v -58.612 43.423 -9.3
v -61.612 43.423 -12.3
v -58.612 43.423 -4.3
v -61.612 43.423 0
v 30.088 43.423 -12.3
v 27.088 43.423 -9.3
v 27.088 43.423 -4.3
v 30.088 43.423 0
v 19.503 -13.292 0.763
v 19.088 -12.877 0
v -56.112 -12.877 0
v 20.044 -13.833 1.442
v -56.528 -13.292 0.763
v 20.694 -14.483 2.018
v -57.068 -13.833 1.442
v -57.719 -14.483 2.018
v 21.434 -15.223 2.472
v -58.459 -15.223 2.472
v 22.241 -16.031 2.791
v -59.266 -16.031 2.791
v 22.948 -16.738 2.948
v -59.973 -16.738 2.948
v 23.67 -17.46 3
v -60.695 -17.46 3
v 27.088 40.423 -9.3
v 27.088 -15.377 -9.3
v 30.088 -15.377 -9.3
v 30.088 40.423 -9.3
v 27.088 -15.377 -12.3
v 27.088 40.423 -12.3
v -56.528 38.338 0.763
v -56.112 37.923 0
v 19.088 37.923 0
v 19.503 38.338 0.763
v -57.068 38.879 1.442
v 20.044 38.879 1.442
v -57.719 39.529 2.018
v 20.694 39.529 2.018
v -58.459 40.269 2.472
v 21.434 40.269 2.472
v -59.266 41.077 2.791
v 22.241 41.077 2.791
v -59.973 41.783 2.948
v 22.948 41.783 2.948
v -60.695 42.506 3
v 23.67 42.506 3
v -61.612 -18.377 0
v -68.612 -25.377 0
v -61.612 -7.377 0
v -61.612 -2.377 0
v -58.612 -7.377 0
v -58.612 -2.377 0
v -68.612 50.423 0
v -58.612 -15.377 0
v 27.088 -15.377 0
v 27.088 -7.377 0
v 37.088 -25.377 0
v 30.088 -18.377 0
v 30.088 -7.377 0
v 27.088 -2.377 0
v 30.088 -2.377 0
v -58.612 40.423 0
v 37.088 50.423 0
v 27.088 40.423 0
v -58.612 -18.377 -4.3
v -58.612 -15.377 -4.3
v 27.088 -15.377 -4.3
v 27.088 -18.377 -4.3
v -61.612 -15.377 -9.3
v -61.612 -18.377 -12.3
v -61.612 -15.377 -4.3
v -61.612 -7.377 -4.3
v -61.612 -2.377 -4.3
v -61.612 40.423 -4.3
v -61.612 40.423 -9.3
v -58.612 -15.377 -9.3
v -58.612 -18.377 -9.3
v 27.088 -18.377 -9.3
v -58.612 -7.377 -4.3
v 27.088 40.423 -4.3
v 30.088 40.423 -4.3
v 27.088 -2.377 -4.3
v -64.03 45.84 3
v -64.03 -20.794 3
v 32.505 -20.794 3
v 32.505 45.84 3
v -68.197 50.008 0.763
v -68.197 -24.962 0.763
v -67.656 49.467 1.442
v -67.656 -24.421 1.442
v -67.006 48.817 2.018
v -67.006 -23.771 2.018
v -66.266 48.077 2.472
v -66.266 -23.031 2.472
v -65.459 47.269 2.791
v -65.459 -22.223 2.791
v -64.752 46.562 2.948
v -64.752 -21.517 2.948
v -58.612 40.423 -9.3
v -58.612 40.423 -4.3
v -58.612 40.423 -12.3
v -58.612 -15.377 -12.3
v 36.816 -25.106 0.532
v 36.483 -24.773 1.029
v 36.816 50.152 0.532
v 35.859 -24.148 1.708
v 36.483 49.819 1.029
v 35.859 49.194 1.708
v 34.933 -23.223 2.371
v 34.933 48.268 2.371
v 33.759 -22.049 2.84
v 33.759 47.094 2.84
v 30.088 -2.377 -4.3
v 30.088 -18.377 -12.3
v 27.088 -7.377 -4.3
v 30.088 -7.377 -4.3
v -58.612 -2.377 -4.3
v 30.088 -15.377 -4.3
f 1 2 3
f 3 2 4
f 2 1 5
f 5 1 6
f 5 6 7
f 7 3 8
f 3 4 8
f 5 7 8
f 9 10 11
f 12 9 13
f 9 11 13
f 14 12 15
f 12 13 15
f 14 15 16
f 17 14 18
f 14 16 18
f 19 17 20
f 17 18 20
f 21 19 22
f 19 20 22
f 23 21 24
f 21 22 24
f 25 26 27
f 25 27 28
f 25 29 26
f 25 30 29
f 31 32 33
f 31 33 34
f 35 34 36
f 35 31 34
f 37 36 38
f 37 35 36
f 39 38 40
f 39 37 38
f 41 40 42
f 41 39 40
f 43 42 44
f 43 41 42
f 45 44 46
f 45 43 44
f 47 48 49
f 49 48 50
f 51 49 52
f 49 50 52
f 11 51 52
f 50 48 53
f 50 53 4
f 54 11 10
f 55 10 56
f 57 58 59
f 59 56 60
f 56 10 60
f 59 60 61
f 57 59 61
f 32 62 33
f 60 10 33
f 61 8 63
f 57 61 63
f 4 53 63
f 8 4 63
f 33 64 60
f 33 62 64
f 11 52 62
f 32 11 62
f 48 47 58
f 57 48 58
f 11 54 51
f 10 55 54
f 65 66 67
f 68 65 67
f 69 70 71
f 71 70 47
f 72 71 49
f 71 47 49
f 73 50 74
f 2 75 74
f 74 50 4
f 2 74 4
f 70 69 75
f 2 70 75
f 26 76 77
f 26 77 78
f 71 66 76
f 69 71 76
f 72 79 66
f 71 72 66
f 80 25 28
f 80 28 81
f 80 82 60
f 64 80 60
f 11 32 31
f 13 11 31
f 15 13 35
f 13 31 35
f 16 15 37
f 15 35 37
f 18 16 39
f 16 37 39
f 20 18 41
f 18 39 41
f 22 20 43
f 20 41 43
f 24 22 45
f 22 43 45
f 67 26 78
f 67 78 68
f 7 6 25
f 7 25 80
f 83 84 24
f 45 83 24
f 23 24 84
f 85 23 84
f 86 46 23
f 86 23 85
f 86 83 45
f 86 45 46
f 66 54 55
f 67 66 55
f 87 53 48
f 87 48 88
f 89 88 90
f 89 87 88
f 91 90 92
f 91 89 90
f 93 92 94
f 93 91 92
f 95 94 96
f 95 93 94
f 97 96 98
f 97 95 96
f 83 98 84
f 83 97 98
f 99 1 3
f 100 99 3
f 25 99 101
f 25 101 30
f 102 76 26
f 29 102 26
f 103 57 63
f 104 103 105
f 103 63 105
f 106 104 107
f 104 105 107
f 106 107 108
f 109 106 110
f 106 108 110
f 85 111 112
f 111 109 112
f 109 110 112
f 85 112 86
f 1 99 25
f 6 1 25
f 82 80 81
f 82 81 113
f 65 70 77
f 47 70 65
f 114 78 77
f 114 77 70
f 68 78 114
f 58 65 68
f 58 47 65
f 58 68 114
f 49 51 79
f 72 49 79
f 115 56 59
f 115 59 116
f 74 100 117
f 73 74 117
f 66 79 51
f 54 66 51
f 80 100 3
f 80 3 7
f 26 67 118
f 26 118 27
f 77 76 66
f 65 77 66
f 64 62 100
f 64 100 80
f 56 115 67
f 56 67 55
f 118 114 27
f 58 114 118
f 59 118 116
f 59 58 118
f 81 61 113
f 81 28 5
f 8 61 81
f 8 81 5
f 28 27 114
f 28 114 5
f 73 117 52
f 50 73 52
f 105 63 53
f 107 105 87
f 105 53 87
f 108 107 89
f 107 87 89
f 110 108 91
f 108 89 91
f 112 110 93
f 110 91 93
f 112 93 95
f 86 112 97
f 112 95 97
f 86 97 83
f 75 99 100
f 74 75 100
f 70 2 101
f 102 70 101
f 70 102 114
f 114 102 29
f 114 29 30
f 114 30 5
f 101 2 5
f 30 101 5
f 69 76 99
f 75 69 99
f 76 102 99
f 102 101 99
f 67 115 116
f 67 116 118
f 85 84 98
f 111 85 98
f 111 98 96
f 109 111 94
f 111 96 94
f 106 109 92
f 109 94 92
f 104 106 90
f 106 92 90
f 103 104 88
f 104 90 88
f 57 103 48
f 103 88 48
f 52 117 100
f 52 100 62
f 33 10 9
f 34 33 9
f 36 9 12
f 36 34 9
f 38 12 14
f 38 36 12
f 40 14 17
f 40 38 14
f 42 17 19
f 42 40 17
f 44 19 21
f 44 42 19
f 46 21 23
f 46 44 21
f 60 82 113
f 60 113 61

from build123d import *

# Parameters (mm, degrees)
F2_W          = 105.7
F2_H          = 75.8
F2_W_2        = 8
F2_H_2        = 2.5
F2_H_3        = 50.8
F4_DEPTH      = 3
F3_W          = 91.7
F3_H          = 61.8
F3_W_2        = 85.7
F3_H_2        = 55.8
F5_DEPTH      = 12.3
F6_W          = 85.7
F6_H          = 5
F7_DEPTH      = 50.4239358673
F7_DEPTH_BACK = 25
F9_DEPTH      = 68.6133680484
F9_DEPTH_BACK = 37.0886319516
F10_T1_DEPTH  = 98.7128784748
F10_T3_DEPTH  = 128.6128784748
F10_T5_DEPTH  = 50.8
F10_T7_DEPTH  = 75.2
F10_T13_DEPTH = 62.2564392374
F10_T17_DEPTH = 86.6564392374
F10_T24_DEPTH = 86.6564392374
F10_T28_DEPTH = 62.2564392374
F10_T35_DEPTH = 86.6564392374
F10_T39_DEPTH = 62.2564392374
F10_T46_DEPTH = 86.6564392374
F10_T50_DEPTH = 62.2564392374


# Not quite as in the source:
# - a fillet or chamfer that OpenCascade refuses, or shapes differently, is made with other operations: its cross-section is extruded or revolved along the edge and cut away or added


with BuildPart() as f4:
    # F2 (on Top) → F4 (new body)
    with BuildSketch(Plane.XY):
        with Locations((-15.7623680484, 12.5229358673)):
            Rectangle(F2_W, F2_H)
        Polygon((-58.6123680484, -15.3770641327), (-58.6123680484, 40.4229358673), (19.0876319516, 40.4229358673), (27.0876319516, 40.4229358673), (27.0876319516, 37.9229358673), (27.0876319516, -12.8770641327), (27.0876319516, -15.3770641327), (19.0876319516, -15.3770641327), align=None, mode=Mode.SUBTRACT)
        Polygon((19.0876319516, 40.4229358673), (-58.6123680484, 40.4229358673), (-58.6123680484, -15.3770641327), (19.0876319516, -15.3770641327), (19.0876319516, -12.8770641327), (-56.1123680484, -12.8770641327), (-56.1123680484, 37.9229358673), (19.0876319516, 37.9229358673), align=None)
        with Locations((23.0876319516, 39.1729358673)):
            Rectangle(F2_W_2, F2_H_2)
        with Locations((23.0876319516, 12.5229358673)):
            Rectangle(F2_W_2, F2_H_3)
        with Locations((23.0876319516, -14.1270641327)):
            Rectangle(F2_W_2, F2_H_2)
    extrude(amount=F4_DEPTH)

    # F3 (on Top) → F5 (join)
    with BuildSketch(Plane.XY):
        with Locations((-15.7623680484, 12.5229358673)):
            Rectangle(F3_W, F3_H)
        with Locations((-15.7623680484, 12.5229358673)):
            Rectangle(F3_W_2, F3_H_2, mode=Mode.SUBTRACT)
    extrude(amount=-F5_DEPTH)

    # F6 (on Front) → F7 (cut, two sides)
    with BuildSketch(Plane.XZ) as f7_sk:
        with Locations((-15.7623680484, -6.8)):
            Rectangle(F6_W, F6_H)
    extrude(amount=-F7_DEPTH, mode=Mode.SUBTRACT)
    extrude(f7_sk.sketch, amount=F7_DEPTH_BACK, mode=Mode.SUBTRACT)

    # F8 (on Right) → F9 (cut, two sides)
    with BuildSketch(Plane.YZ) as f9_sk:
        Polygon((-2.3770641327, -3.112567123), (-2.3770641327, 0), (-7.3770641327, 0), (-7.3770641327, -3.112567123), (-7.3770641327, -4.3), (-2.3770641327, -4.3), align=None)
        Polygon((40.4229358673, -9.3), (40.4229358673, -4.3), (-2.3770641327, -4.3), (-7.3770641327, -4.3), (-15.3770641327, -4.3), (-15.3770641327, -9.3), align=None)
    extrude(amount=-F9_DEPTH, mode=Mode.SUBTRACT)
    extrude(f9_sk.sketch, amount=F9_DEPTH_BACK, mode=Mode.SUBTRACT)

    # F10: fillet of radius 5 on 8 edges, made by hand

    # F10_s2 → F10_t1 (cut)
    with BuildSketch(Plane.XZ.offset(-61.8793751047)):
        with BuildLine():
            ThreePointArc((37.0876319516, 0), (35.2436690442, 2.1833001327), (32.5050562567, 3))
            Line((32.5050562567, 3), (32.5050562567, 3.1))
            Line((32.5050562567, 3.1), (37.0876319516, 3.1))
            Line((37.0876319516, 3.1), (37.1876319516, 3))
            ThreePointArc((37.1876319516, 3), (37.1876319516, 1.5), (37.1792834655, 0.04))
            Line((37.1792834655, 0.04), (37.0876319516, 0))
        make_face()
        with BuildLine():
            ThreePointArc((-68.6123680484, 0), (-66.768405141, 2.1833001327), (-64.0297923534, 3))
            Line((-64.0297923534, 3), (-64.0297923534, 3.1))
            Line((-64.0297923534, 3.1), (-68.6123680484, 3.1))
            Line((-68.6123680484, 3.1), (-68.7123680484, 3))
            ThreePointArc((-68.7123680484, 3), (-68.7123680484, 1.5), (-68.7040195623, 0.04))
            Line((-68.7040195623, 0.04), (-68.6123680484, 0))
        make_face()
    extrude(amount=F10_T1_DEPTH, mode=Mode.SUBTRACT)

    # F10_s4 → F10_t3 (cut)
    with BuildSketch(Plane.YZ.offset(-80.0688072858)):
        with BuildLine():
            ThreePointArc((50.4229358673, 0), (48.5789729599, 2.1833001327), (45.8403601724, 3))
            Line((45.8403601724, 3), (45.8403601724, 3.1))
            Line((45.8403601724, 3.1), (50.4229358673, 3.1))
            Line((50.4229358673, 3.1), (50.5229358673, 3))
            ThreePointArc((50.5229358673, 3), (50.5229358673, 1.5), (50.5145873812, 0.04))
            Line((50.5145873812, 0.04), (50.4229358673, 0))
        make_face()
        with BuildLine():
            ThreePointArc((-20.7944884377, 3), (-23.5331012253, 2.1833001327), (-25.3770641327, 0))
            Line((-25.3770641327, 0), (-25.4687156466, 0.04))
            ThreePointArc((-25.4687156466, 0.04), (-25.4770641327, 1.5), (-25.4770641327, 3))
            Line((-25.4770641327, 3), (-25.3770641327, 3.1))
            Line((-25.3770641327, 3.1), (-20.7944884377, 3.1))
            Line((-20.7944884377, 3.1), (-20.7944884377, 3))
        make_face()
    extrude(amount=F10_T3_DEPTH, mode=Mode.SUBTRACT)

    # F10_s6 → F10_t5 (cut)
    with BuildSketch(Plane.XZ.offset(-37.9229358673)):
        with BuildLine():
            ThreePointArc((19.0876319516, 0), (20.931594859, 2.1833001327), (23.6702076466, 3))
            Line((23.6702076466, 3), (23.6702076466, 3.1))
            Line((23.6702076466, 3.1), (19.0876319516, 3.1))
            Line((19.0876319516, 3.1), (18.9876319516, 3))
            ThreePointArc((18.9876319516, 3), (18.9876319516, 1.5), (18.9959804377, 0.04))
            Line((18.9959804377, 0.04), (19.0876319516, 0))
        make_face()
        with BuildLine():
            ThreePointArc((-56.1123680484, 0), (-57.9563309558, 2.1833001327), (-60.6949437433, 3))
            Line((-60.6949437433, 3), (-60.6949437433, 3.1))
            Line((-60.6949437433, 3.1), (-56.1123680484, 3.1))
            Line((-56.1123680484, 3.1), (-56.0123680484, 3))
            ThreePointArc((-56.0123680484, 3), (-56.0123680484, 1.5), (-56.0207165345, 0.04))
            Line((-56.0207165345, 0.04), (-56.1123680484, 0))
        make_face()
    extrude(amount=F10_T5_DEPTH, mode=Mode.SUBTRACT)

    # F10_s8 → F10_t7 (cut)
    with BuildSketch(Plane.YZ.offset(-56.1123680484)):
        with BuildLine():
            ThreePointArc((-12.8770641327, 0), (-14.7210270401, 2.1833001327), (-17.4596398276, 3))
            Line((-17.4596398276, 3), (-17.4596398276, 3.1))
            Line((-17.4596398276, 3.1), (-12.8770641327, 3.1))
            Line((-12.8770641327, 3.1), (-12.7770641327, 3))
            ThreePointArc((-12.7770641327, 3), (-12.7770641327, 1.5), (-12.7854126188, 0.04))
            Line((-12.7854126188, 0.04), (-12.8770641327, 0))
        make_face()
        with BuildLine():
            ThreePointArc((37.9229358673, 0), (39.7668987747, 2.1833001327), (42.5055115623, 3))
            Line((42.5055115623, 3), (42.5055115623, 3.1))
            Line((42.5055115623, 3.1), (37.9229358673, 3.1))
            Line((37.9229358673, 3.1), (37.8229358673, 3))
            ThreePointArc((37.8229358673, 3), (37.8229358673, 1.5), (37.8312843534, 0.04))
            Line((37.8312843534, 0.04), (37.9229358673, 0))
        make_face()
    extrude(amount=F10_T7_DEPTH, mode=Mode.SUBTRACT)


with BuildPart() as f10_tool11:
    # F10_s12 → F10_t13 (new body)
    with BuildSketch(Plane.XZ.offset(-49.3793751047)):
        with BuildLine():
            ThreePointArc((19.0876319516, 0), (20.931594859, 2.1833001327), (23.6702076466, 3))
            Line((23.6702076466, 3), (23.6702076466, 3.1))
            Line((23.6702076466, 3.1), (19.0876319516, 3.1))
            Line((19.0876319516, 3.1), (18.9876319516, 3))
            ThreePointArc((18.9876319516, 3), (18.9876319516, 1.5), (18.9959804377, 0.04))
            Line((18.9959804377, 0.04), (19.0876319516, 0))
        make_face()
    extrude(amount=F10_T13_DEPTH)

    split(bisect_by=Plane.XZ.offset(-37.9229358673), keep=Keep.BOTTOM)


with BuildPart() as f10_tool15:
    # F10_s16 → F10_t17 (new body)
    with BuildSketch(Plane.YZ.offset(-56.1123680484)):
        with BuildLine():
            ThreePointArc((37.9229358673, 0), (39.7668987747, 2.1833001327), (42.5055115623, 3))
            Line((42.5055115623, 3), (42.5055115623, 3.1))
            Line((42.5055115623, 3.1), (37.9229358673, 3.1))
            Line((37.9229358673, 3.1), (37.8229358673, 3))
            ThreePointArc((37.8229358673, 3), (37.8229358673, 1.5), (37.8312843534, 0.04))
            Line((37.8312843534, 0.04), (37.9229358673, 0))
        make_face()
    extrude(amount=F10_T17_DEPTH)

    split(bisect_by=Plane.YZ.offset(19.0876319516), keep=Keep.TOP)


with BuildPart() as f10_tool11_1:
    add(f10_tool11.part)

    # F10_t19: intersect F10_tool15
    add(f10_tool15.part, mode=Mode.INTERSECT)


with BuildPart() as f4_1:
    add(f4.part)

    # F10_t9: cut F10_tool11
    add(f10_tool11_1.part, mode=Mode.SUBTRACT)


with BuildPart() as f10_tool22:
    # F10_s23 → F10_t24 (new body)
    with BuildSketch(Plane.YZ.offset(30.544071189)):
        with BuildLine():
            ThreePointArc((-12.8770641327, 0), (-14.7210270401, 2.1833001327), (-17.4596398276, 3))
            Line((-17.4596398276, 3), (-17.4596398276, 3.1))
            Line((-17.4596398276, 3.1), (-12.8770641327, 3.1))
            Line((-12.8770641327, 3.1), (-12.7770641327, 3))
            ThreePointArc((-12.7770641327, 3), (-12.7770641327, 1.5), (-12.7854126188, 0.04))
            Line((-12.7854126188, 0.04), (-12.8770641327, 0))
        make_face()
    extrude(amount=-F10_T24_DEPTH)

    split(bisect_by=Plane.YZ.offset(19.0876319516), keep=Keep.TOP)


with BuildPart() as f10_tool26:
    # F10_s27 → F10_t28 (new body)
    with BuildSketch(Plane.XZ.offset(-37.9229358673)):
        with BuildLine():
            ThreePointArc((19.0876319516, 0), (20.931594859, 2.1833001327), (23.6702076466, 3))
            Line((23.6702076466, 3), (23.6702076466, 3.1))
            Line((23.6702076466, 3.1), (19.0876319516, 3.1))
            Line((19.0876319516, 3.1), (18.9876319516, 3))
            ThreePointArc((18.9876319516, 3), (18.9876319516, 1.5), (18.9959804377, 0.04))
            Line((18.9959804377, 0.04), (19.0876319516, 0))
        make_face()
    extrude(amount=F10_T28_DEPTH)

    split(bisect_by=Plane.XZ.offset(12.8770641327), keep=Keep.TOP)


with BuildPart() as f10_tool22_1:
    add(f10_tool22.part)

    # F10_t30: intersect F10_tool26
    add(f10_tool26.part, mode=Mode.INTERSECT)


with BuildPart() as f4_2:
    add(f4_1.part)

    # F10_t20: cut F10_tool22
    add(f10_tool22_1.part, mode=Mode.SUBTRACT)


with BuildPart() as f10_tool33:
    # F10_s34 → F10_t35 (new body)
    with BuildSketch(Plane.YZ.offset(19.0876319516)):
        with BuildLine():
            ThreePointArc((-12.8770641327, 0), (-14.7210270401, 2.1833001327), (-17.4596398276, 3))
            Line((-17.4596398276, 3), (-17.4596398276, 3.1))
            Line((-17.4596398276, 3.1), (-12.8770641327, 3.1))
            Line((-12.8770641327, 3.1), (-12.7770641327, 3))
            ThreePointArc((-12.7770641327, 3), (-12.7770641327, 1.5), (-12.7854126188, 0.04))
            Line((-12.7854126188, 0.04), (-12.8770641327, 0))
        make_face()
    extrude(amount=-F10_T35_DEPTH)

    split(bisect_by=Plane.YZ.offset(-56.1123680484), keep=Keep.BOTTOM)


with BuildPart() as f10_tool37:
    # F10_s38 → F10_t39 (new body)
    with BuildSketch(Plane.XZ.offset(24.3335033701)):
        with BuildLine():
            ThreePointArc((-56.1123680484, 0), (-57.9563309558, 2.1833001327), (-60.6949437433, 3))
            Line((-60.6949437433, 3), (-60.6949437433, 3.1))
            Line((-60.6949437433, 3.1), (-56.1123680484, 3.1))
            Line((-56.1123680484, 3.1), (-56.0123680484, 3))
            ThreePointArc((-56.0123680484, 3), (-56.0123680484, 1.5), (-56.0207165345, 0.04))
            Line((-56.0207165345, 0.04), (-56.1123680484, 0))
        make_face()
    extrude(amount=-F10_T39_DEPTH)

    split(bisect_by=Plane.XZ.offset(12.8770641327), keep=Keep.TOP)


with BuildPart() as f10_tool33_1:
    add(f10_tool33.part)

    # F10_t41: intersect F10_tool37
    add(f10_tool37.part, mode=Mode.INTERSECT)


with BuildPart() as f4_3:
    add(f4_2.part)

    # F10_t31: cut F10_tool33
    add(f10_tool33_1.part, mode=Mode.SUBTRACT)


with BuildPart() as f10_tool44:
    # F10_s45 → F10_t46 (new body)
    with BuildSketch(Plane.YZ.offset(-67.5688072858)):
        with BuildLine():
            ThreePointArc((37.9229358673, 0), (39.7668987747, 2.1833001327), (42.5055115623, 3))
            Line((42.5055115623, 3), (42.5055115623, 3.1))
            Line((42.5055115623, 3.1), (37.9229358673, 3.1))
            Line((37.9229358673, 3.1), (37.8229358673, 3))
            ThreePointArc((37.8229358673, 3), (37.8229358673, 1.5), (37.8312843534, 0.04))
            Line((37.8312843534, 0.04), (37.9229358673, 0))
        make_face()
    extrude(amount=F10_T46_DEPTH)

    split(bisect_by=Plane.YZ.offset(-56.1123680484), keep=Keep.BOTTOM)


with BuildPart() as f10_tool48:
    # F10_s49 → F10_t50 (new body)
    with BuildSketch(Plane.XZ.offset(12.8770641327)):
        with BuildLine():
            ThreePointArc((-56.1123680484, 0), (-57.9563309558, 2.1833001327), (-60.6949437433, 3))
            Line((-60.6949437433, 3), (-60.6949437433, 3.1))
            Line((-60.6949437433, 3.1), (-56.1123680484, 3.1))
            Line((-56.1123680484, 3.1), (-56.0123680484, 3))
            ThreePointArc((-56.0123680484, 3), (-56.0123680484, 1.5), (-56.0207165345, 0.04))
            Line((-56.0207165345, 0.04), (-56.1123680484, 0))
        make_face()
    extrude(amount=-F10_T50_DEPTH)

    split(bisect_by=Plane.XZ.offset(-37.9229358673), keep=Keep.BOTTOM)


with BuildPart() as f10_tool44_1:
    add(f10_tool44.part)

    # F10_t52: intersect F10_tool48
    add(f10_tool48.part, mode=Mode.INTERSECT)


with BuildPart() as f4_4:
    add(f4_3.part)

    # F10_t42: cut F10_tool44
    add(f10_tool44_1.part, mode=Mode.SUBTRACT)


solid = f4_4.part
